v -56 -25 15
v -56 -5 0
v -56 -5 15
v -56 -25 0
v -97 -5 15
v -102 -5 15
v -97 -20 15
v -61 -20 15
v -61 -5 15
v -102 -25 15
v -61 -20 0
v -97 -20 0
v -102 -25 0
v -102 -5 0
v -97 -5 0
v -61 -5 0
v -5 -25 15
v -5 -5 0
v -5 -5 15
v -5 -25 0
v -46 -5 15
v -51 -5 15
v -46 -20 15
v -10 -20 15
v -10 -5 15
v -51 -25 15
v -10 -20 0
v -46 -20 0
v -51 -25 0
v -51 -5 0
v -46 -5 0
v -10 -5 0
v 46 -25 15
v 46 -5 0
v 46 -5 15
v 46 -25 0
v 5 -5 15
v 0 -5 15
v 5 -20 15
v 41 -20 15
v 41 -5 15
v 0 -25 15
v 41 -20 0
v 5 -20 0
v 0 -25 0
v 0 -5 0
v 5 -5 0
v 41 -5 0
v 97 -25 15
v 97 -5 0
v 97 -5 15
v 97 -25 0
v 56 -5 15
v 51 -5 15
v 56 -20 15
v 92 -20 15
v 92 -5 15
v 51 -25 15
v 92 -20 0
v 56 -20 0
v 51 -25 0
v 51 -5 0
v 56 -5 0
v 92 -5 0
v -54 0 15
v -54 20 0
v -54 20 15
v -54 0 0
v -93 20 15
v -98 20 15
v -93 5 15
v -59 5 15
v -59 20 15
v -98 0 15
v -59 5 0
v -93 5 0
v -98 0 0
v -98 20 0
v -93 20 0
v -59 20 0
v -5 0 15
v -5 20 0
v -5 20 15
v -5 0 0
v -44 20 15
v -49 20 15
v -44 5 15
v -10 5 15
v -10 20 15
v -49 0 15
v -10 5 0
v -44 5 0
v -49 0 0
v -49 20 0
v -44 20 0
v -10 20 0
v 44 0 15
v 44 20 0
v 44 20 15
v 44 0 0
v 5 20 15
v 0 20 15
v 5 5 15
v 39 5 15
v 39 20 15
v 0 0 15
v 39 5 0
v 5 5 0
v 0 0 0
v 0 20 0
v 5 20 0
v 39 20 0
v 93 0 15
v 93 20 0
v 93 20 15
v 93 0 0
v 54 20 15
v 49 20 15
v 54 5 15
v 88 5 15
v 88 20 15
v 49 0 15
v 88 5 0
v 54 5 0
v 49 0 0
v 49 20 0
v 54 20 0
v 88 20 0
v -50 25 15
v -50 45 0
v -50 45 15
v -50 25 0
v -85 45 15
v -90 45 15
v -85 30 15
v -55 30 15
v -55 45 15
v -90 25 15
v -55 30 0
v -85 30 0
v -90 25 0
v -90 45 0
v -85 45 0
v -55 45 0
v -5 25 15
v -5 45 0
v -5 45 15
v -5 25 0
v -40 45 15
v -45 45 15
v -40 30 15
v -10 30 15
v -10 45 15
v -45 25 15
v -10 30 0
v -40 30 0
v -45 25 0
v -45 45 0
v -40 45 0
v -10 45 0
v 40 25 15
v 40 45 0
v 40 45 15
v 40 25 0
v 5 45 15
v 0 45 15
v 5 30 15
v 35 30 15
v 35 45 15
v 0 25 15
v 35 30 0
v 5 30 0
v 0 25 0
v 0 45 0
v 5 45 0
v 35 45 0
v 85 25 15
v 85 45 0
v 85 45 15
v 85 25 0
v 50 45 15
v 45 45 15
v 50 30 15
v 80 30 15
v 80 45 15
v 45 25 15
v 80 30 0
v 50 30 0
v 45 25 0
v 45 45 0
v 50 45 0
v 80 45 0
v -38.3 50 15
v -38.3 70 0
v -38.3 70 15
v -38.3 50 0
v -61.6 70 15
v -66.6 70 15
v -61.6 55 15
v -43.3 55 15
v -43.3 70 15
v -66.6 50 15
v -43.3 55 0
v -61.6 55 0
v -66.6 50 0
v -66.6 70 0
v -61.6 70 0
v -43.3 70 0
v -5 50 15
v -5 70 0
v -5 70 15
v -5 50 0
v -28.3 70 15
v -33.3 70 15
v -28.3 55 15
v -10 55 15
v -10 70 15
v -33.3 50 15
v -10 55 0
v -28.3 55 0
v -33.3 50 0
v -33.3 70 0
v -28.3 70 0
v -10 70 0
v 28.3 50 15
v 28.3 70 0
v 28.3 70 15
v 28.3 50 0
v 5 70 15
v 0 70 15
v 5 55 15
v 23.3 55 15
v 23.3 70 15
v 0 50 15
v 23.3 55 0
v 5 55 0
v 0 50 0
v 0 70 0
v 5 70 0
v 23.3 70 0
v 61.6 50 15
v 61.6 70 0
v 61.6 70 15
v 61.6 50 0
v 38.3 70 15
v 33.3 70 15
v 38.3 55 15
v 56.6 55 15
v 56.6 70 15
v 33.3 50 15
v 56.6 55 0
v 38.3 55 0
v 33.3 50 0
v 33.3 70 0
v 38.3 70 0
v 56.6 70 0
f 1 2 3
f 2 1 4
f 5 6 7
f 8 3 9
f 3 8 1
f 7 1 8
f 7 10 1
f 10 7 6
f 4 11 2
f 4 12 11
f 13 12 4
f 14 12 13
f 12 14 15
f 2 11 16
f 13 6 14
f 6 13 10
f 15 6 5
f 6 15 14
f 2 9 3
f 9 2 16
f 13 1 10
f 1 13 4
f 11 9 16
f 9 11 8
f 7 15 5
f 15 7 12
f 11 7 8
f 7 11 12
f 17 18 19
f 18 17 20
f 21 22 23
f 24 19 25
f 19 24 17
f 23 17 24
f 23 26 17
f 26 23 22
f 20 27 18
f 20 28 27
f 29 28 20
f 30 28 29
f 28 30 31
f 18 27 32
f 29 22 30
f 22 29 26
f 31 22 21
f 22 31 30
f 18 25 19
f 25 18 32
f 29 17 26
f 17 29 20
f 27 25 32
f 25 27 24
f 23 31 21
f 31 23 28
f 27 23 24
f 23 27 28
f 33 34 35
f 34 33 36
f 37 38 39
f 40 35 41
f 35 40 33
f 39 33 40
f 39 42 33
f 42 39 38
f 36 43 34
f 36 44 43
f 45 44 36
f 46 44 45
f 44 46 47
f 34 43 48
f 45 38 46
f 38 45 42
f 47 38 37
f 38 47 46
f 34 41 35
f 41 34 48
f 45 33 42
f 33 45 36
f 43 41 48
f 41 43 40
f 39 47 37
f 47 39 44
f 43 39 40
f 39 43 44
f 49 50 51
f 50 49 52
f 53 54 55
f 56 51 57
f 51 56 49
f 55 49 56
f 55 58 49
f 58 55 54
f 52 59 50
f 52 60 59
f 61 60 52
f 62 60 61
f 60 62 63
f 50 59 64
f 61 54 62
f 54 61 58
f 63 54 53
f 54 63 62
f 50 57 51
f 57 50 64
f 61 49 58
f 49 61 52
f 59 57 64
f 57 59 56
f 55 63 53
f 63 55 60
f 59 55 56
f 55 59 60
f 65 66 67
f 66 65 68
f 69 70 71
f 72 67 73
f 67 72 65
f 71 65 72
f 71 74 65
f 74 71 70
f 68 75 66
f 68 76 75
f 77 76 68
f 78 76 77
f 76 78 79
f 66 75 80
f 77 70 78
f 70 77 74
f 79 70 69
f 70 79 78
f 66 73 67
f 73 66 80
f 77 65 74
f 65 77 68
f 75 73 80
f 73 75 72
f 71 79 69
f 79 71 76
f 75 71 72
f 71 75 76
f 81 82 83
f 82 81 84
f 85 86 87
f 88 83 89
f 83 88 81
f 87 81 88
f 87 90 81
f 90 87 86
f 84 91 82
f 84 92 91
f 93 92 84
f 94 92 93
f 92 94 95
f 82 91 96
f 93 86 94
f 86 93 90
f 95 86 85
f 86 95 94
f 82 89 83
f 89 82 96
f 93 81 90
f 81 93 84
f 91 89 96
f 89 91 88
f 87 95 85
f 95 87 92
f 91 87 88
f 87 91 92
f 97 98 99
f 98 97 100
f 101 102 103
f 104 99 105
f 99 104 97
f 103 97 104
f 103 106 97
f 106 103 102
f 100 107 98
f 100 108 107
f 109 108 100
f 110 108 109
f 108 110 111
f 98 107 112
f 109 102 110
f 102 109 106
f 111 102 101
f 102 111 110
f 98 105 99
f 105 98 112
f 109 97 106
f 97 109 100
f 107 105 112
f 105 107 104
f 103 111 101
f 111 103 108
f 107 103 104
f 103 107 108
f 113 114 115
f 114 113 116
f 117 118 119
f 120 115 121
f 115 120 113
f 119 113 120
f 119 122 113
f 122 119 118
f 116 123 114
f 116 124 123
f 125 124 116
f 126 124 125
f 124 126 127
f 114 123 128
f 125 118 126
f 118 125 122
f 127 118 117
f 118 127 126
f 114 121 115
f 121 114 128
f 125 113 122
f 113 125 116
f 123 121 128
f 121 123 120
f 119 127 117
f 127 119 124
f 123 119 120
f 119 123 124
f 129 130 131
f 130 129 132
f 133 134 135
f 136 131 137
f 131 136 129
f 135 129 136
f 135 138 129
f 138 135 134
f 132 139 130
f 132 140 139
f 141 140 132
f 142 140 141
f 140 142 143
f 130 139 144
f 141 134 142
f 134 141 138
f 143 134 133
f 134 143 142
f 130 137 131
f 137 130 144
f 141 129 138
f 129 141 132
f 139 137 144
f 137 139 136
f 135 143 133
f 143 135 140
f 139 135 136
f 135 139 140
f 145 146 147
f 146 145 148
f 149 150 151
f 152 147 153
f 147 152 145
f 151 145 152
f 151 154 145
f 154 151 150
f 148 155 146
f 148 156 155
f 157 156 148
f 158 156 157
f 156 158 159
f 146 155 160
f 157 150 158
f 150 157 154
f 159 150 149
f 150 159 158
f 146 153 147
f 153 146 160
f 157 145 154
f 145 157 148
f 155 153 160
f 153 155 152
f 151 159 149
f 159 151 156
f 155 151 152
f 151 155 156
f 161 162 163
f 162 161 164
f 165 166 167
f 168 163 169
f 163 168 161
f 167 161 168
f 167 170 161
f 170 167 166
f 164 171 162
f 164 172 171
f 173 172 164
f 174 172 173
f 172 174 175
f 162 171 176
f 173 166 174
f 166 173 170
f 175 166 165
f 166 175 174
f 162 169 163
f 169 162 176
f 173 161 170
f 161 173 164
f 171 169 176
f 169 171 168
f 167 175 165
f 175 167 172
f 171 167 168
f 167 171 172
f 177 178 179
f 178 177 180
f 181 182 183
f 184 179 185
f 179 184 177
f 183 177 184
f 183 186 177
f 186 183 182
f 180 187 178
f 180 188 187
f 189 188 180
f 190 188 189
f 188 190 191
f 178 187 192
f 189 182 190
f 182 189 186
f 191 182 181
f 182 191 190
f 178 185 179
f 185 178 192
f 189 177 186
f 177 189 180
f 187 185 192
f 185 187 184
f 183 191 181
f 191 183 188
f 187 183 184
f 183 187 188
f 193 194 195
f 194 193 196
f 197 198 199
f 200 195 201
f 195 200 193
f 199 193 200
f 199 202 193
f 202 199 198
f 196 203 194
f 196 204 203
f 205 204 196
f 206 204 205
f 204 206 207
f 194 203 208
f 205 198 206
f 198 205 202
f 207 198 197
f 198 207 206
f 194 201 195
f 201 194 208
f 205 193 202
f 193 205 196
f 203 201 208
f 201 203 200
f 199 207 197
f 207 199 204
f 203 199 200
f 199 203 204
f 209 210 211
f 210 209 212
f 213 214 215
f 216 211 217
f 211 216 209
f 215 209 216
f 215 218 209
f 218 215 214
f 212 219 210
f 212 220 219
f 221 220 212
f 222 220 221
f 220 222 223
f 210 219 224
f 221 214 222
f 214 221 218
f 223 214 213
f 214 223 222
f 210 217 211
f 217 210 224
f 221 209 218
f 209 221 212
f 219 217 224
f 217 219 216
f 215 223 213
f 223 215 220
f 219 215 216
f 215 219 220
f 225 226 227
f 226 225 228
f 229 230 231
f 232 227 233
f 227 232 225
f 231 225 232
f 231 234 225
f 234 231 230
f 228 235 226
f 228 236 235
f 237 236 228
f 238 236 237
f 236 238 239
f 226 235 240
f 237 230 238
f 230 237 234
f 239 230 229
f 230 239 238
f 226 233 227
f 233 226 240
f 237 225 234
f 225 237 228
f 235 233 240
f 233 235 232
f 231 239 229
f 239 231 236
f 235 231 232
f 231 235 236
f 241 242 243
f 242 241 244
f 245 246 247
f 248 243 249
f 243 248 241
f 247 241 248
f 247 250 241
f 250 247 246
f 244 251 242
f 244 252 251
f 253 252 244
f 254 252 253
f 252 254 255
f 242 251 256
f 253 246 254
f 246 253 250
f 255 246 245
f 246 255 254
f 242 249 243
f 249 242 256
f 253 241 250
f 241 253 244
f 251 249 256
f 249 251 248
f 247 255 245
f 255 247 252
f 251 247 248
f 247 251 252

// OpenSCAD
door = 34;
counter = 30;
ply = 18.3;
fridge = 36;

tweak = 0.2;

for (v =[-2: 1]) {
    translate([v * (fridge + 5 * 2 + 5), -25, 0])
        profile(fridge, 15, 15, 5);
}

for (v =[-2: 1]) {
    translate([v * (door + 5 * 2 + 5), 0, 0])
        profile(door, 15, 15, 5);
}

for (v =[-2: 1]) {
    translate([v * (counter + 5 * 2 + 5), 25, 0])
        profile(counter, 15, 15, 5);
}

for (v =[-2: 1]) {
    translate([v * (ply + 5 * 2 + 5), 50, 0])
        profile(ply, 15, 15, 5);
}

module profile(thickness, height, length, wall) {
    difference() {
        cube([thickness + wall * 2, height + wall, length]);
        
        translate([wall, wall, -0.1]) cube([thickness, height * 1.5, length * 1.1]);
}
}
